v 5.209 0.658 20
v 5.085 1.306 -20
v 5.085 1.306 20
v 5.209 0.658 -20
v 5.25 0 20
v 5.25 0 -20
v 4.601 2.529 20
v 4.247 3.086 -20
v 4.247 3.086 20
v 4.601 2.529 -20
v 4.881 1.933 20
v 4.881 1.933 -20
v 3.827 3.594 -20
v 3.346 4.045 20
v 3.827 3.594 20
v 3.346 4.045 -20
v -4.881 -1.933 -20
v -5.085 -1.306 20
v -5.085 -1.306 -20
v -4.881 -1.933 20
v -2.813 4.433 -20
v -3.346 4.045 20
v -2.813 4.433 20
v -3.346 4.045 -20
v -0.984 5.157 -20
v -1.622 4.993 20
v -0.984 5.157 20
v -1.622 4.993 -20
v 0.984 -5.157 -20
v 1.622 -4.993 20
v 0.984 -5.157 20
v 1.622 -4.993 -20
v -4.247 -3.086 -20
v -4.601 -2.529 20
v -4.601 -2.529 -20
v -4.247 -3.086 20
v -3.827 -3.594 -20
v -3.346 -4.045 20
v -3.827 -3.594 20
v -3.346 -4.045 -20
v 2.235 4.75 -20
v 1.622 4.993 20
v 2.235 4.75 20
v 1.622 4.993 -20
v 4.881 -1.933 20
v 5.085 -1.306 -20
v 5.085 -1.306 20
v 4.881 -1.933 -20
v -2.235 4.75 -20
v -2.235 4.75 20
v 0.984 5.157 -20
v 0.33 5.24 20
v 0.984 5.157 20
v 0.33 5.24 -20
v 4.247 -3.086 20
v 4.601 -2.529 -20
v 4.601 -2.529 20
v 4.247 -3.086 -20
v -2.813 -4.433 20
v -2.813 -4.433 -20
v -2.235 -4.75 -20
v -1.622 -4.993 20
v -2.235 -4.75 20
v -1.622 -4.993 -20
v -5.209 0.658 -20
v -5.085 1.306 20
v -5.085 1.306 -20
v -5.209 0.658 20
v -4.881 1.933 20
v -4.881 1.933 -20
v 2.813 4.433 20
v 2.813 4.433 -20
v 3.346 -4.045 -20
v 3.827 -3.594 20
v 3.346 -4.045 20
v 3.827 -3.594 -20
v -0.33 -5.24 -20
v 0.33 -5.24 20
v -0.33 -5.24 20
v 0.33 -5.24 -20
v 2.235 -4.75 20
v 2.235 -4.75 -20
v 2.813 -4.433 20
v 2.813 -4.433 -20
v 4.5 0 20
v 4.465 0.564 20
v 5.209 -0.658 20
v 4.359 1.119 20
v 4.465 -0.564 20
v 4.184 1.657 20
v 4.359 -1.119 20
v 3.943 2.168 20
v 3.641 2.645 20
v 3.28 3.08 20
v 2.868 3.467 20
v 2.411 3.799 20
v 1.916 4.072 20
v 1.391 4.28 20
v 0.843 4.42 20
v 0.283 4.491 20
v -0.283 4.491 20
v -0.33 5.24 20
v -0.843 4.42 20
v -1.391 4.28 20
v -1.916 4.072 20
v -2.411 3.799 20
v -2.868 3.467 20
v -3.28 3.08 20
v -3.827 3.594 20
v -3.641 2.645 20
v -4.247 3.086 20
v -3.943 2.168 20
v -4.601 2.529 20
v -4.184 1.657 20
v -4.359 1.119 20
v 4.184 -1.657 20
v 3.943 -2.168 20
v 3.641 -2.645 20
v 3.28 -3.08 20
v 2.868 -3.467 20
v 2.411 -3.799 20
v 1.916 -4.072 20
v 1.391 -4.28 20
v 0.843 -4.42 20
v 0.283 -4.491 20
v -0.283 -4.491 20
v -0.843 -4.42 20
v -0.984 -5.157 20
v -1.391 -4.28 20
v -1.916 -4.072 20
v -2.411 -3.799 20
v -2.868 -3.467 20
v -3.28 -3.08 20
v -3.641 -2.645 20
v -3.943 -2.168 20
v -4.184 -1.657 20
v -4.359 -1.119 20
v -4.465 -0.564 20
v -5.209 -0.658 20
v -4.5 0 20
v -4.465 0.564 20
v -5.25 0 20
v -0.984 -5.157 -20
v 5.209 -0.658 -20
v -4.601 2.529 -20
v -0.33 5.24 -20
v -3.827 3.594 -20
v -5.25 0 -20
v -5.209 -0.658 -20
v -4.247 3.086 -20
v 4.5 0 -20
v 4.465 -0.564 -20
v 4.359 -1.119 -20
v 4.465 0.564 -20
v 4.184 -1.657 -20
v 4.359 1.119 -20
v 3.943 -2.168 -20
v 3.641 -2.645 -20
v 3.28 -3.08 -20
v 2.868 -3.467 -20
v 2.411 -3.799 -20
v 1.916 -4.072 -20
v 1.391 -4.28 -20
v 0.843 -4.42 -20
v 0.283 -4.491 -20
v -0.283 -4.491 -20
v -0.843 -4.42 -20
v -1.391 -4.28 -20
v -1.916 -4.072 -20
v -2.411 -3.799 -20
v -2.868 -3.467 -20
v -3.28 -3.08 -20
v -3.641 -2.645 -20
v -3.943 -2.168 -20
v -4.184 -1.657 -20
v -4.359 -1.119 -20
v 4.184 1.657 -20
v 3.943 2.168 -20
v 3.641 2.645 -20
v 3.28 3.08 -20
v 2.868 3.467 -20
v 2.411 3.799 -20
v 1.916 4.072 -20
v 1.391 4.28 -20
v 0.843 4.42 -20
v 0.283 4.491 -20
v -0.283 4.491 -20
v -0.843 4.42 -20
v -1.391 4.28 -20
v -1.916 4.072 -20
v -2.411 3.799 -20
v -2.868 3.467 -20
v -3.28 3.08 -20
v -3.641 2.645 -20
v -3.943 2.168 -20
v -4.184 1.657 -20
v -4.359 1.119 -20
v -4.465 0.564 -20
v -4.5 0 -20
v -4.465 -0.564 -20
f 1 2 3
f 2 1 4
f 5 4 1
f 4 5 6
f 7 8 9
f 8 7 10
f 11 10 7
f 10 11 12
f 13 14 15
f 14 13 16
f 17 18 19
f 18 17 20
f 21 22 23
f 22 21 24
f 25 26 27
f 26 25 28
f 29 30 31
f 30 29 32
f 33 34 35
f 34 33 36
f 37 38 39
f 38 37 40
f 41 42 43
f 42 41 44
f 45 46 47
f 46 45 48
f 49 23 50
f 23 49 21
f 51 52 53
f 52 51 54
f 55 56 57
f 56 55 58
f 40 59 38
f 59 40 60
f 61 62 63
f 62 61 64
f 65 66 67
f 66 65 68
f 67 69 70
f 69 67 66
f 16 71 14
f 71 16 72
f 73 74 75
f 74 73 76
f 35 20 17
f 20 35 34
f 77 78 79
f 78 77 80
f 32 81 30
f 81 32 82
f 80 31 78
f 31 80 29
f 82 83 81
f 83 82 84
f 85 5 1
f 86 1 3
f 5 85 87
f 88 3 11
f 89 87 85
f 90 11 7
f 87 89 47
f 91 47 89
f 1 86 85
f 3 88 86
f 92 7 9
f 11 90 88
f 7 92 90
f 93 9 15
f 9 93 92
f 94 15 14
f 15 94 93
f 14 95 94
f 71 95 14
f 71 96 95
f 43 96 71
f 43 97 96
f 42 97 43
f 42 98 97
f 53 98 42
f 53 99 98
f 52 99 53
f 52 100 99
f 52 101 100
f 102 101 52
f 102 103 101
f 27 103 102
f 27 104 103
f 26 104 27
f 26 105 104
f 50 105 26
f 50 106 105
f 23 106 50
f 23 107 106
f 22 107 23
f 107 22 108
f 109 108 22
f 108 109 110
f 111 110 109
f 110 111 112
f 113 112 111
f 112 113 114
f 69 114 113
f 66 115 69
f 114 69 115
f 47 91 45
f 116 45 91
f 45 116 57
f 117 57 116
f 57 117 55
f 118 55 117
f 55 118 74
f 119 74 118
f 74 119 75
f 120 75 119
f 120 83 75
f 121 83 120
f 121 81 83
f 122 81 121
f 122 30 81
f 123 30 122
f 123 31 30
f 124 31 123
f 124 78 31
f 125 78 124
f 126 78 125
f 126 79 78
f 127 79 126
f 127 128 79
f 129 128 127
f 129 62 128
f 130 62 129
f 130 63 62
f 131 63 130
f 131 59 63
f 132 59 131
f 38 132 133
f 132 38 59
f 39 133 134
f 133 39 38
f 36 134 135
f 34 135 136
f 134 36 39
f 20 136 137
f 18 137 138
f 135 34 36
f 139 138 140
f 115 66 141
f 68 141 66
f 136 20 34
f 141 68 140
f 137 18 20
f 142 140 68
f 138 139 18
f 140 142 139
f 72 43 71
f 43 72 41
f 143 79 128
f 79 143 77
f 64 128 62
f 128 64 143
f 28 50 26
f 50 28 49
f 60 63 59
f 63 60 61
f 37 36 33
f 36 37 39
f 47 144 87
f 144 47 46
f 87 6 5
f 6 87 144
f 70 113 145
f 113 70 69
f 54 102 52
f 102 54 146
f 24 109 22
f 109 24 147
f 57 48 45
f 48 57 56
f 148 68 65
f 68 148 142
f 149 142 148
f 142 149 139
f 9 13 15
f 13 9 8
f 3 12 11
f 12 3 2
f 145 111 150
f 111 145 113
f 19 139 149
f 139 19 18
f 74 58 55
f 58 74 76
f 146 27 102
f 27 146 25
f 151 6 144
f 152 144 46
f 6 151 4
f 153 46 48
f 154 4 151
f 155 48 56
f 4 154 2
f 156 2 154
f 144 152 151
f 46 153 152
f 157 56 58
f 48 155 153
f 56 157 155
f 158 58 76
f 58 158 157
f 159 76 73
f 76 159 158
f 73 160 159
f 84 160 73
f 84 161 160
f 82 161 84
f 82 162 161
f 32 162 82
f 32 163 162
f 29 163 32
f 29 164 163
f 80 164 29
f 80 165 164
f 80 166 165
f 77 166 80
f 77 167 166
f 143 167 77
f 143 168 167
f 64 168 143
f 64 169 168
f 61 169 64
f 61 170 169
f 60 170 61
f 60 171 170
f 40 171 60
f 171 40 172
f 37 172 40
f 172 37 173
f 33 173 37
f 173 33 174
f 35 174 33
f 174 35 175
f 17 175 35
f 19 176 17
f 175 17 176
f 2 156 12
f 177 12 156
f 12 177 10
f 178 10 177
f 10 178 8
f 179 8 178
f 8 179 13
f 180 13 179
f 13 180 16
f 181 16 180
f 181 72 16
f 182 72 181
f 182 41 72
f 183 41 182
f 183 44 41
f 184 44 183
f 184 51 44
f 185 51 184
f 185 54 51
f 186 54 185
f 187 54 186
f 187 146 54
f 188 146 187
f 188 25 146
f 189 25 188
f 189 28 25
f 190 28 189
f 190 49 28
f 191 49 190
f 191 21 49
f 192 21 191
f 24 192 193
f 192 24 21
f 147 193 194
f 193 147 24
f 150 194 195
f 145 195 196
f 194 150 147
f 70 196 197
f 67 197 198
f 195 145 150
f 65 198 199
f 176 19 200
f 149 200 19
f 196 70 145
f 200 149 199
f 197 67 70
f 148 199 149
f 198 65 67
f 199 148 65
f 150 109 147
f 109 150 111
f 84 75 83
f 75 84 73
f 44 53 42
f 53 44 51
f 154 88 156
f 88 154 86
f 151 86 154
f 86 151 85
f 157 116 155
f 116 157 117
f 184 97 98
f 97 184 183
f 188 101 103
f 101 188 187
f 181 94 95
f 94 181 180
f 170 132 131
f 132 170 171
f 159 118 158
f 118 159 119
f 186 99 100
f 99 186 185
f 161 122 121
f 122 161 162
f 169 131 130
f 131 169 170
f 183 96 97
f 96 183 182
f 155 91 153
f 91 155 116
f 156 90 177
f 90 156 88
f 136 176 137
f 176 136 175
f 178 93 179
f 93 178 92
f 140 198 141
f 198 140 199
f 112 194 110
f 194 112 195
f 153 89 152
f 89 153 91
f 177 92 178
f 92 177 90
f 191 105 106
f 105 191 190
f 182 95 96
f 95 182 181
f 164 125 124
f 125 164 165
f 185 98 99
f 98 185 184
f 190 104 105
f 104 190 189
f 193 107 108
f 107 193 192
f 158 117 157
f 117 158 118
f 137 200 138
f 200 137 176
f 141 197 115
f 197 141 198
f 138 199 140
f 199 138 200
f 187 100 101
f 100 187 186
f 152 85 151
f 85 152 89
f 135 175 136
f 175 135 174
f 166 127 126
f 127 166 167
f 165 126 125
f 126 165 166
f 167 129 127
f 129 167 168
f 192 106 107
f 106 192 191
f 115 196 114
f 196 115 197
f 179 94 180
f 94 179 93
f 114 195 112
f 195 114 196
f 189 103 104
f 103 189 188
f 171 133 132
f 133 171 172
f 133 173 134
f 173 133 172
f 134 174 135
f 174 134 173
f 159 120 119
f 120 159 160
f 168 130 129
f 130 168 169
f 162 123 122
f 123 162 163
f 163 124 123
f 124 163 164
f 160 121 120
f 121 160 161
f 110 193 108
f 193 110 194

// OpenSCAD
$fn = 50;


difference() {
	union() {
		translate(v = [0, 0, -20.0000000000]) {
			cylinder(h = 40, r = 5.2500000000);
		}
	}
	union() {
		translate(v = [0, 0, -100.0000000000]) {
			cylinder(h = 200, r = 4.5000000000);
		}
	}
}
